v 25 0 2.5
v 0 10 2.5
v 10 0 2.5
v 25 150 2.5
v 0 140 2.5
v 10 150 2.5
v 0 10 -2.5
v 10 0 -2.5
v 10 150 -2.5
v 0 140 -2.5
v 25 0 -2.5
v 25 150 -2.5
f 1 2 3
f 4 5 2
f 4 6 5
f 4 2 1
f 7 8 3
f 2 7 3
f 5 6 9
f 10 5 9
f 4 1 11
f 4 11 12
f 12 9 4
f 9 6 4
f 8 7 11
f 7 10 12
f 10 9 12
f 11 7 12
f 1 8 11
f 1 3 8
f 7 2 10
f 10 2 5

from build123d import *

# Parameters (mm, degrees)
SKETCH_1_W      = 25
SKETCH_1_H      = 150
EXTRUDE_1_DEPTH = 2.5
CHAMFER_1_SIZE  = 10


with BuildPart() as part:
    # Эскиз1 → Бобышка-Вытянуть1 (new, symmetric)
    with BuildSketch(Plane.XY):
        with Locations((12.5, 75)):
            Rectangle(SKETCH_1_W, SKETCH_1_H)
    extrude(amount=EXTRUDE_1_DEPTH, both=True)

    # Фаска1
    chamfer_1_edges = [part.edges().sort_by_distance(p)[0] for p in [
        (0, 0, 0),
        (0, 150, 0),
    ]]
    chamfer(chamfer_1_edges, length=CHAMFER_1_SIZE)


solid = part.part
